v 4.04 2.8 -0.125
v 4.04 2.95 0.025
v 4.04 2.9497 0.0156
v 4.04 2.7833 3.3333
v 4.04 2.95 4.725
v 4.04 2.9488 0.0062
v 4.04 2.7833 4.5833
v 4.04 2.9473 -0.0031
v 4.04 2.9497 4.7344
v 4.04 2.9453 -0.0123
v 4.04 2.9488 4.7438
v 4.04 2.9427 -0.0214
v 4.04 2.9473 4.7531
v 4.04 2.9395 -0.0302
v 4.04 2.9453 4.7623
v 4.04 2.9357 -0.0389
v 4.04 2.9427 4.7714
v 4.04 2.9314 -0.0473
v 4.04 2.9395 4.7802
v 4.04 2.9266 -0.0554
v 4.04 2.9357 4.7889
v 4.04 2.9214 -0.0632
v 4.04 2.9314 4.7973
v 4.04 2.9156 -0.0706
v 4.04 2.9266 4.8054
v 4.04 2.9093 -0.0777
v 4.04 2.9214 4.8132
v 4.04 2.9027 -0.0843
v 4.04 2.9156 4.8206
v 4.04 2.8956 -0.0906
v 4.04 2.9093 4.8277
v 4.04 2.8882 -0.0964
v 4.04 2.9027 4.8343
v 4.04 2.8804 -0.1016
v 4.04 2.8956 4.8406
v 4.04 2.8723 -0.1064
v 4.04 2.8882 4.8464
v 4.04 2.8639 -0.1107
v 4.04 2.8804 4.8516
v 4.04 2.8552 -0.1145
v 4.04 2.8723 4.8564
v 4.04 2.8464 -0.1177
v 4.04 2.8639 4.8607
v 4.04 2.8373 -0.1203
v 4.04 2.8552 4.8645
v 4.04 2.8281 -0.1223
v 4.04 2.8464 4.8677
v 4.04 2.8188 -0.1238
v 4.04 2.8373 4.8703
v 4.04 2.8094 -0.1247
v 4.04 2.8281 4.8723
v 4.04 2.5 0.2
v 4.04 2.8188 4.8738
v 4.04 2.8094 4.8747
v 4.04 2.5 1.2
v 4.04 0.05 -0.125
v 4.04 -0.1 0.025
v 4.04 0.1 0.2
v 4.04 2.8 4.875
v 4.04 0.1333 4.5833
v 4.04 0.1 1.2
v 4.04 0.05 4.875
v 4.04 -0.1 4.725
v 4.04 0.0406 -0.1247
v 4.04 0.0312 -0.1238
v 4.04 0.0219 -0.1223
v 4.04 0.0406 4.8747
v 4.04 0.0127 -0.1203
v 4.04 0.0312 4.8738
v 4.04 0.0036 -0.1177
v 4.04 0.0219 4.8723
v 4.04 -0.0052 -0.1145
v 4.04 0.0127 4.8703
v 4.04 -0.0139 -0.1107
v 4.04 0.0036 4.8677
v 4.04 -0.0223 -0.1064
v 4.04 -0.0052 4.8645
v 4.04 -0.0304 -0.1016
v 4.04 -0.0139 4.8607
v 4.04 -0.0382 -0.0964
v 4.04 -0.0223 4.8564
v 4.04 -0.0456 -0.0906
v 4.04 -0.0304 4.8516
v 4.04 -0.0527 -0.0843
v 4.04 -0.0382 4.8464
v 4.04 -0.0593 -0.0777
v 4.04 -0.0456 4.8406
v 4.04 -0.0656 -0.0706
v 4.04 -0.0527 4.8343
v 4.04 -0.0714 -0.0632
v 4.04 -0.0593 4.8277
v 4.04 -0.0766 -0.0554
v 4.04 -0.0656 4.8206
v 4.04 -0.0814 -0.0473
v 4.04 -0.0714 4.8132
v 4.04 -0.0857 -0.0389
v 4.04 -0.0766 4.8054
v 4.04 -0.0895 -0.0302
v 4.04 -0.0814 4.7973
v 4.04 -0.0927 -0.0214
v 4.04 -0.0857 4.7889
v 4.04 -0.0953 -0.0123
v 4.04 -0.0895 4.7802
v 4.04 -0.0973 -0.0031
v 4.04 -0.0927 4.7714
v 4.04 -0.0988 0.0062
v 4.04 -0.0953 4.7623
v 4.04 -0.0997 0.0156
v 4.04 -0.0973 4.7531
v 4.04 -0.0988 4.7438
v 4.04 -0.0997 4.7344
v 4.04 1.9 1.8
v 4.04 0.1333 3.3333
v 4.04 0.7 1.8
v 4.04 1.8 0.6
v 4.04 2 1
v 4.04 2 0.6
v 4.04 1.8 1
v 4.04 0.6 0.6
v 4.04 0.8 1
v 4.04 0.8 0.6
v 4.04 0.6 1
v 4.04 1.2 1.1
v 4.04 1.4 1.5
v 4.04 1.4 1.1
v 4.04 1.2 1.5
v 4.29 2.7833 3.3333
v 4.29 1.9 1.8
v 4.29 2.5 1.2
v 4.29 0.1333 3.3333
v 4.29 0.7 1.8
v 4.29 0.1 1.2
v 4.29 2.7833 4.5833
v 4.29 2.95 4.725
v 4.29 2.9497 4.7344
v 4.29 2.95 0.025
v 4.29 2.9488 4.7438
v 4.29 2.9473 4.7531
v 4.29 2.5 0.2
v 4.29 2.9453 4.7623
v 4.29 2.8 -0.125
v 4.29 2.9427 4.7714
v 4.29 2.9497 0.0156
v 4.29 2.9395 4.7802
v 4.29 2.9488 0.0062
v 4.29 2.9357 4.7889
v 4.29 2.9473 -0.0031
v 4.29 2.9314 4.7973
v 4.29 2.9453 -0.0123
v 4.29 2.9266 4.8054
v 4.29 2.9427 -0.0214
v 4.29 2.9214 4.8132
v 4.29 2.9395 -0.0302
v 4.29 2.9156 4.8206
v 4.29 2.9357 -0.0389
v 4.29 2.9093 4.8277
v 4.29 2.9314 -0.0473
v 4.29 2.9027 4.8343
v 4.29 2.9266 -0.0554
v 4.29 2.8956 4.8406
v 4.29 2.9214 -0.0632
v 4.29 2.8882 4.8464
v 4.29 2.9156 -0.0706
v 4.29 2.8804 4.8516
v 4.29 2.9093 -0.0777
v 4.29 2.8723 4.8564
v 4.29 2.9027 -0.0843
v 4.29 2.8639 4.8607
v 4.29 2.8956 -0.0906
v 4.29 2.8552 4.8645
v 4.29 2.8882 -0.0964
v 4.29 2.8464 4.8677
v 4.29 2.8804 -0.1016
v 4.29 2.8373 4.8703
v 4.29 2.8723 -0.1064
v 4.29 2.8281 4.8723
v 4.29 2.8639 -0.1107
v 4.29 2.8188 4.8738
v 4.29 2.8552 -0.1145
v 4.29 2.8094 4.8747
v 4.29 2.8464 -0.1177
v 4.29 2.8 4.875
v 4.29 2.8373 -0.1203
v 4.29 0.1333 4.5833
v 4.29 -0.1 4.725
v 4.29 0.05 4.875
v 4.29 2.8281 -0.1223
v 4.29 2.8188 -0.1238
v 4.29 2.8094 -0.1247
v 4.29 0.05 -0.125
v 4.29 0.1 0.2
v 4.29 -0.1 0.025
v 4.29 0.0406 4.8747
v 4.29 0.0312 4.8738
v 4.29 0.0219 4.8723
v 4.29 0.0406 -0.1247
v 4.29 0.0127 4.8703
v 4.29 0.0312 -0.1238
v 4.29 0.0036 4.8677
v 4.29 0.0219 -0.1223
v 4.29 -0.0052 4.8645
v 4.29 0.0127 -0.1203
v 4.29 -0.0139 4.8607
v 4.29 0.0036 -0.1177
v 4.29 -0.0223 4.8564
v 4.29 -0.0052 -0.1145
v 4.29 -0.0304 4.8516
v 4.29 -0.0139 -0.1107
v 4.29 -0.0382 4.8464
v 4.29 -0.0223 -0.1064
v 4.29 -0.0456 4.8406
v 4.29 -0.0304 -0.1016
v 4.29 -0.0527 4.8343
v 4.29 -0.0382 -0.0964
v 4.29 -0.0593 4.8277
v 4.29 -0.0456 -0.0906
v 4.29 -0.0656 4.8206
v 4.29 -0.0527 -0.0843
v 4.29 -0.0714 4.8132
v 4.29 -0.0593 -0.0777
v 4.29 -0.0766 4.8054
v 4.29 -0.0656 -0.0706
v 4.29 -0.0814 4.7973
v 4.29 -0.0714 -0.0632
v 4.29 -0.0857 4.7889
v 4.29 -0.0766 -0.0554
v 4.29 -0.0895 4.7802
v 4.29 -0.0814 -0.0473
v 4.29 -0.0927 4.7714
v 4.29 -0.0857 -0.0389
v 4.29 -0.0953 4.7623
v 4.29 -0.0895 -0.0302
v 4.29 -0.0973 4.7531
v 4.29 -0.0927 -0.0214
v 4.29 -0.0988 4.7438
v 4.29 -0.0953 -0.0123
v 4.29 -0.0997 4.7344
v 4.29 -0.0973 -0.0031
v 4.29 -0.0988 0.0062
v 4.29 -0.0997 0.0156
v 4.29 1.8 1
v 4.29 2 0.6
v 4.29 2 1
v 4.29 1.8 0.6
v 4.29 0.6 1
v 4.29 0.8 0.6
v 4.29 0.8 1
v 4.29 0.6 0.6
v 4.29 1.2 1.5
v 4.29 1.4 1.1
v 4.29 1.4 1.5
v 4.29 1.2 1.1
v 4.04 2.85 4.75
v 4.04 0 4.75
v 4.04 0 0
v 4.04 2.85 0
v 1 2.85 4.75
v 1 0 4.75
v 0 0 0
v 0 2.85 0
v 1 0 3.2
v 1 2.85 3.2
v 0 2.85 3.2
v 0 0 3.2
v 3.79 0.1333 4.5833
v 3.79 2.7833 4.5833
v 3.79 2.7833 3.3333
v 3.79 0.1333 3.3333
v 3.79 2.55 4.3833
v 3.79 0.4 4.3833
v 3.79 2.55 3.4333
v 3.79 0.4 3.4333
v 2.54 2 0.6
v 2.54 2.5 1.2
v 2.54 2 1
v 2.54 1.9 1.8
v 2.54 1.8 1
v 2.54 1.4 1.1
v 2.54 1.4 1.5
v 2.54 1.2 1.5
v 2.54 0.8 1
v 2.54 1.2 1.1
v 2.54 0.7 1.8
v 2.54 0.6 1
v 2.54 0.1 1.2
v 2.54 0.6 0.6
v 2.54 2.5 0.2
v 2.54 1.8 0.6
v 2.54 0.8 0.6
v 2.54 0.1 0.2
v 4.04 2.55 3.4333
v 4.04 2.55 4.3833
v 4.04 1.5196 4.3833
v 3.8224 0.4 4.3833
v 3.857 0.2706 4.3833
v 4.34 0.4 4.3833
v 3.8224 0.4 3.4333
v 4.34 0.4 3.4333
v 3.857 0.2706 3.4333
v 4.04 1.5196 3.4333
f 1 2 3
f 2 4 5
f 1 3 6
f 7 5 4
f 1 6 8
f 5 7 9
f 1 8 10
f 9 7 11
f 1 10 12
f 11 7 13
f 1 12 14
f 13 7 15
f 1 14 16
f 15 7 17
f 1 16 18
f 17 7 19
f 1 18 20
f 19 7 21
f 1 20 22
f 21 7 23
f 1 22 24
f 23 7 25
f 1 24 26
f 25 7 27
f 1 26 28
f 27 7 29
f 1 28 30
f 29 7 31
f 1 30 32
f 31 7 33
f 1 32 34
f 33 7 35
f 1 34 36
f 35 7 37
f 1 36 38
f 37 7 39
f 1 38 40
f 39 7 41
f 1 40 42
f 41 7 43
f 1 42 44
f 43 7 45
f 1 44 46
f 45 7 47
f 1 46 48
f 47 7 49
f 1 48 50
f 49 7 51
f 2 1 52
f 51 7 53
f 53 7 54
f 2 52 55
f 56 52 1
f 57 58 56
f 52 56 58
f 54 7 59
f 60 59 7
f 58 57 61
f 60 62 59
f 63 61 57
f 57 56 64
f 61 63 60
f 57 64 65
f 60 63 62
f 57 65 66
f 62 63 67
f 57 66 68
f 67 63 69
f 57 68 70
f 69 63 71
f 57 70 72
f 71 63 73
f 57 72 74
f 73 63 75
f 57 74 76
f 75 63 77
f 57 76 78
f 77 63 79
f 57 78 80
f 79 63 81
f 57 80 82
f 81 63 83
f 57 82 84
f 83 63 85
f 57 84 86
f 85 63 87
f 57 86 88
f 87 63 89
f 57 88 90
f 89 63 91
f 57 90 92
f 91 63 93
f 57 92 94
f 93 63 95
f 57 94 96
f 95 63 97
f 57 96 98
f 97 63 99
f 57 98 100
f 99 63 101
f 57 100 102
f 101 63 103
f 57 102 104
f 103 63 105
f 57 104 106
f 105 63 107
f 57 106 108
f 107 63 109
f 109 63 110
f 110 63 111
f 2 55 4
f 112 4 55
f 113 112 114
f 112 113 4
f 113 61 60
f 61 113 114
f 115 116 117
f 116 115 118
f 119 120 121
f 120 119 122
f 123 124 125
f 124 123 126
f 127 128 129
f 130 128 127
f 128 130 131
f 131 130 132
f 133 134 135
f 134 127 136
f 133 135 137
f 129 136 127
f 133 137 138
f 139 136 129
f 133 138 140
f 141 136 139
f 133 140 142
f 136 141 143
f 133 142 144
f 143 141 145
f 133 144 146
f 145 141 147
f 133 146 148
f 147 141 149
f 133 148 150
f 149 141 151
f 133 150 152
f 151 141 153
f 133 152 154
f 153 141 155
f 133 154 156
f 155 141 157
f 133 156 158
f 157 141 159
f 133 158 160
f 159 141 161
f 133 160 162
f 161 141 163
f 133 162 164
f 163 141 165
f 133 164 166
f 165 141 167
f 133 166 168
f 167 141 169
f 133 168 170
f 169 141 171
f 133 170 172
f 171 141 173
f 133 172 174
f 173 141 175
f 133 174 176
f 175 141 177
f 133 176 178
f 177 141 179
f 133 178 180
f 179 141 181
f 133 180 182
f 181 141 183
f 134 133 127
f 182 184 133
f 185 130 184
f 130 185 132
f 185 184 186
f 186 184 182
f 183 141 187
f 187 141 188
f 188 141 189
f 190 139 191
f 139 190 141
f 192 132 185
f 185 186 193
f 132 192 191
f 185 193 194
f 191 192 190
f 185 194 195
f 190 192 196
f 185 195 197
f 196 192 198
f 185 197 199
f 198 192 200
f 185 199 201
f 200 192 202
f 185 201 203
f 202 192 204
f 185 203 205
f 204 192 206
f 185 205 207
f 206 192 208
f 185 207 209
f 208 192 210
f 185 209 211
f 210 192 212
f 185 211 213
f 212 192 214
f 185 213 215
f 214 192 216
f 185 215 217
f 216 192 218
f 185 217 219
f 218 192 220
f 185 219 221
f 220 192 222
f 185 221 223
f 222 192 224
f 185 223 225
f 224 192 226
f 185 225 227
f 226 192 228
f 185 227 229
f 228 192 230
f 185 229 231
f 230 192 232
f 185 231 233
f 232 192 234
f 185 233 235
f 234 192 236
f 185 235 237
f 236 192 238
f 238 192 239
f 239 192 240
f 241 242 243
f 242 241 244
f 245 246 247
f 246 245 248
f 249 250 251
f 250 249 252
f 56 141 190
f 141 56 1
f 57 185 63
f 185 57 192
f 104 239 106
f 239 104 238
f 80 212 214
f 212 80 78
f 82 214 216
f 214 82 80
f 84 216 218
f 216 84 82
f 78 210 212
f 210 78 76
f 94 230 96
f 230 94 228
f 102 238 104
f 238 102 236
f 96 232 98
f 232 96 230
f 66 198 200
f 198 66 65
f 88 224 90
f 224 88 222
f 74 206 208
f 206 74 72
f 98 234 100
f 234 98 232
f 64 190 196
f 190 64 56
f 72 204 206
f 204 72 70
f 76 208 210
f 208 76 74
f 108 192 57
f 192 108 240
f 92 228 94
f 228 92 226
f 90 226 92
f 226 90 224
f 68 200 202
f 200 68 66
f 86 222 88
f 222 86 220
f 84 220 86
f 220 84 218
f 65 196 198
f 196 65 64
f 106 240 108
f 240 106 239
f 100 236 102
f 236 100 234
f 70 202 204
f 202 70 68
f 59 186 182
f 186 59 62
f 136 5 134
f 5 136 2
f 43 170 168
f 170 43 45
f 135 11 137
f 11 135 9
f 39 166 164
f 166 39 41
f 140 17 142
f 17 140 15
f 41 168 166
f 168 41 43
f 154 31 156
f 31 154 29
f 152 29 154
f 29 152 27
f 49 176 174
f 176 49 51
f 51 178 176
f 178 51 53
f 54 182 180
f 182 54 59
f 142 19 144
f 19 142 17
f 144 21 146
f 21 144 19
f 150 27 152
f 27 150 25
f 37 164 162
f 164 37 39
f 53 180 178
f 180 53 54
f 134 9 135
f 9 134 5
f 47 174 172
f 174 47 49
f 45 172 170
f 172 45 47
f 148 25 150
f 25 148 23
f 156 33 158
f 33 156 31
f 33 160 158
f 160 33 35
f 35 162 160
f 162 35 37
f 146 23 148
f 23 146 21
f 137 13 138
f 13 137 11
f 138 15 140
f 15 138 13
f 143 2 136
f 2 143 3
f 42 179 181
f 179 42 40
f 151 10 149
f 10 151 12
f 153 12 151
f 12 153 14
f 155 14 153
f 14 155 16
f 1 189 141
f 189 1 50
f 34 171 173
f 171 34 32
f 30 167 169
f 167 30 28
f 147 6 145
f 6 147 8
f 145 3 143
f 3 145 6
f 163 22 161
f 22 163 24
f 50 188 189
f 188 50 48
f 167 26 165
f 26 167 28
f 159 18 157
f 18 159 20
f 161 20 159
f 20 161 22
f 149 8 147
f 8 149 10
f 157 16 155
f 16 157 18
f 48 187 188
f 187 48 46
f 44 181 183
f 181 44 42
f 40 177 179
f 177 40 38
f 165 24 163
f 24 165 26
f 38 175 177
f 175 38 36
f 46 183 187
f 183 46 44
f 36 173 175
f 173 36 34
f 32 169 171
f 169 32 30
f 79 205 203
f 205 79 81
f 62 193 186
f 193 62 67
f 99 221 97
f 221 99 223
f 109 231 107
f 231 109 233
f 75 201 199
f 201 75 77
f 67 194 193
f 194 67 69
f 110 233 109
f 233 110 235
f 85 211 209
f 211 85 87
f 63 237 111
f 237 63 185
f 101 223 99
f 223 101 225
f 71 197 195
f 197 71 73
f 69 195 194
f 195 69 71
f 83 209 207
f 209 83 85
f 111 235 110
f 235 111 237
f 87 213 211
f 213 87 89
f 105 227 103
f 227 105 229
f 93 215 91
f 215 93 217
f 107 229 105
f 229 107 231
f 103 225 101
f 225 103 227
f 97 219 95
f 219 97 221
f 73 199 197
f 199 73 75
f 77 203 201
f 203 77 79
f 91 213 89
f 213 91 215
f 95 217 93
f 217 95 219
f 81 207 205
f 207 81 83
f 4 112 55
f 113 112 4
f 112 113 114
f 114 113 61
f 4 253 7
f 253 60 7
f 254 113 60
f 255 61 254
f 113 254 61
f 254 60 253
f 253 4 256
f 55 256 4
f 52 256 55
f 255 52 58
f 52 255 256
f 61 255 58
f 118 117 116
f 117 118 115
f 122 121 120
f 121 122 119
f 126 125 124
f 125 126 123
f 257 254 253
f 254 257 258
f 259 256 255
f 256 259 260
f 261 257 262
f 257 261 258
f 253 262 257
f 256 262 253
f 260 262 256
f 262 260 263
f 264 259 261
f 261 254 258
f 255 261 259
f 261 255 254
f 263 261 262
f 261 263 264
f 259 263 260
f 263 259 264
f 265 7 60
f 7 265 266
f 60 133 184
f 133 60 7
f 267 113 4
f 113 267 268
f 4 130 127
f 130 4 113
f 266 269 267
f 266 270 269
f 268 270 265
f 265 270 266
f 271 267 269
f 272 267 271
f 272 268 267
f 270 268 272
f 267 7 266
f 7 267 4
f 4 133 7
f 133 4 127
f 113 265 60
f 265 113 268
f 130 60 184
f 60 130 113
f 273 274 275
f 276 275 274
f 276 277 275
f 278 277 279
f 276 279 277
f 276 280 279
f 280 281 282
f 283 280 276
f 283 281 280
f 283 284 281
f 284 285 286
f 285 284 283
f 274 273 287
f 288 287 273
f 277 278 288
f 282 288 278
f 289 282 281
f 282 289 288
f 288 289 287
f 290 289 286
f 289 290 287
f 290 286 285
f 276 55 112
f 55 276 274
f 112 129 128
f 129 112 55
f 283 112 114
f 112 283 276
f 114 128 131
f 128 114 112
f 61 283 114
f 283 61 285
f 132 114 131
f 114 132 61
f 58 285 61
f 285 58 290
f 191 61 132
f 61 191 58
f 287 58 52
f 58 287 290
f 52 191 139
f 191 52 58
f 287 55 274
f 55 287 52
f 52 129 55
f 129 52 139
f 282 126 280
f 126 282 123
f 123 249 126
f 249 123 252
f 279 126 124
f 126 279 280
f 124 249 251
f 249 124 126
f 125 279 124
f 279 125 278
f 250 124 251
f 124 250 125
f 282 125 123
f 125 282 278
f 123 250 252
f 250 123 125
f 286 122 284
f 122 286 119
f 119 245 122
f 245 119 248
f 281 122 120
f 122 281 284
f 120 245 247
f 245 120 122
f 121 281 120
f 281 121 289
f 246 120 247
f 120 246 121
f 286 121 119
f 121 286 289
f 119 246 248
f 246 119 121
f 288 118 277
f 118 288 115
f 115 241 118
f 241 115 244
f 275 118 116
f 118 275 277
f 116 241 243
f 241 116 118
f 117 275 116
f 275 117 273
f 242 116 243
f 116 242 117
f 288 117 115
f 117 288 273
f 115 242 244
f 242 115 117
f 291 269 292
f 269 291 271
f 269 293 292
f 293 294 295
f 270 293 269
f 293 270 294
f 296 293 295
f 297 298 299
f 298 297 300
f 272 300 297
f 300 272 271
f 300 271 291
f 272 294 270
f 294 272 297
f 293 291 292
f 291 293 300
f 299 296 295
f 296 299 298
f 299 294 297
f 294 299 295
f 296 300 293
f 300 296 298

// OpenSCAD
// file: c14.scad
//polygon(points=[[0,0],[100,0],[0,100],[10,10],[80,10],[10,80]], paths=[[0,1,2],[3,4,5]],convexity=10);

SLOT_L  = 2.4;
SLOT_H  = 1.6;
CORNER  = 0.6;
PIN_X   = 0.5;
PIN_Y   = 0.4;
PIN_Y_2 = 0.9;

POINTS = [
    [0,0],
    [SLOT_L, 0],
    [SLOT_L, SLOT_H - CORNER],
    [SLOT_L - CORNER, SLOT_H],
    [CORNER, SLOT_H],
    [0.0, SLOT_H - CORNER]
];


module c14_profile() {
    difference() {
        polygon(points = POINTS); //, paths = POINTS, convexity = 10);
        
        PIN_H = 0.4;
        PIN_W = 0.2;
        
        translate([PIN_X, PIN_Y, 0]) {
            square([PIN_W, PIN_H]);
        }
        
        translate([SLOT_L - PIN_X - PIN_W, PIN_Y, 0]) {
            square([PIN_W, PIN_H]);
        }
        
        translate([(SLOT_L - PIN_W)/ 2, PIN_Y_2, 0]) {
            square([PIN_W, PIN_H]);
        }
        
    }
}


module c14_inlet() {
    
    C14_DEPTH = 2.0;
    
    linear_extrude(height = C14_DEPTH, convexity = 10, slices = 20, scale = 1.0)  {
        c14_profile();
    }
}

//c14_inlet();
// file: include.scad
//$fs = 0.05;
$fn = 100;
//$fa = 20;

OVERLAP = 0.1;

module rounded_cuboid(dimensions, CORNER_R) {
    
    MB_L = dimensions[0];
    MB_W = dimensions[1];
    MB_H = dimensions[2];
    
    difference() {
        cube([MB_L, MB_W, MB_H]);
        difference() {
            translate([0,0,0])                              { cube([CORNER_R, CORNER_R, MB_H]);}
            translate([CORNER_R,CORNER_R,0])                { cylinder(h = MB_H, r = CORNER_R, $fs = 0.1);}
        }
        difference() {
            translate([MB_L-CORNER_R,MB_W-CORNER_R,0])      { cube([CORNER_R, CORNER_R, MB_H+1]);}
            translate([MB_L - CORNER_R,MB_W - CORNER_R,0])  { cylinder(h = MB_H, r = CORNER_R, $fs = 0.1);}
        }
        difference() {
            translate([0,MB_W-CORNER_R,0])                  { cube([CORNER_R, CORNER_R, MB_H+1]);}
            translate([CORNER_R,MB_W - CORNER_R,0])         { cylinder(h = MB_H, r = CORNER_R, $fs = 0.1);}
        }
        difference() {
            translate([MB_L-CORNER_R,0,0])                  { cube([CORNER_R, CORNER_R, MB_H+1]);}
            translate([MB_L - CORNER_R,CORNER_R,0])         { cylinder(h = MB_H, r = CORNER_R, $fs = 0.1);}
        }
    }
}
// main file
include <include.scad>
include <c14.scad>

module power_inlet() {
    
    L_frame = 5.0;
    W_frame = 3.05;
    H_frame = 0.25;
    
    // front block sizes
    L1 = 3.04;
    W1 = 2.85;
    H1 = 4.75;
    
    // second back block sizes
    L2 = 1.0;
    W2 = 2.85;
    H2 = 3.2;
    
    BUTTON_HOLE_H = L_frame / 4;
    BUTTON_HOLE_W = W_frame - 0.4;
    BUTTON_HOLE_DEPTH = 0.5 + OVERLAP;
    
    difference() {
    union() {
    union() {
        // face frame sizes
        
        
        
    
        // frame
        radius = 0.15;
        translate ([H_frame + L1 + L2, -(W_frame - W1)/2, -(L_frame - H1)/2]) {
        rotate([0,-90,0]) {
            rounded_cuboid([L_frame, W_frame, H_frame], radius);
        }
        }
    
        
        
        // front block
        translate ([L2, 0.0, 0.0] ) { cube([L1, W1, H1]); }
    }
    
        // second back block
        cube([L2, W2, H2]);
    }
    
        
        
        translate([L1 + L2 - BUTTON_HOLE_DEPTH + H_frame + OVERLAP, -(BUTTON_HOLE_W - W_frame) / 3, L_frame * (4/6)]) {
            cube([BUTTON_HOLE_DEPTH , BUTTON_HOLE_W, BUTTON_HOLE_H]);
        }
        
        translate([L1 + L2 - 1.50, (W_frame - W1) / 2, 0.2]) {
        rotate([90, 0, 90]) {
            c14_inlet();
        }}
    }
    
    BUTTON_L = BUTTON_HOLE_W - 0.5;
    BUTTON_H = BUTTON_HOLE_H - 0.3;
    BUTTON_W = 0.5;
    
    translate([L1 + L2, -(BUTTON_HOLE_W - W_frame) , L_frame * (4/6) + 0.1]) {
        rotate([0, 0, 90]) {
            cube([BUTTON_L, BUTTON_W, BUTTON_H]);
            translate([0, -0.3, 0]) {
            rotate([0, 0, 15]) {
                cube([BUTTON_L, BUTTON_W, BUTTON_H]);
            }}
        }

    }
    

    
}


power_inlet();
